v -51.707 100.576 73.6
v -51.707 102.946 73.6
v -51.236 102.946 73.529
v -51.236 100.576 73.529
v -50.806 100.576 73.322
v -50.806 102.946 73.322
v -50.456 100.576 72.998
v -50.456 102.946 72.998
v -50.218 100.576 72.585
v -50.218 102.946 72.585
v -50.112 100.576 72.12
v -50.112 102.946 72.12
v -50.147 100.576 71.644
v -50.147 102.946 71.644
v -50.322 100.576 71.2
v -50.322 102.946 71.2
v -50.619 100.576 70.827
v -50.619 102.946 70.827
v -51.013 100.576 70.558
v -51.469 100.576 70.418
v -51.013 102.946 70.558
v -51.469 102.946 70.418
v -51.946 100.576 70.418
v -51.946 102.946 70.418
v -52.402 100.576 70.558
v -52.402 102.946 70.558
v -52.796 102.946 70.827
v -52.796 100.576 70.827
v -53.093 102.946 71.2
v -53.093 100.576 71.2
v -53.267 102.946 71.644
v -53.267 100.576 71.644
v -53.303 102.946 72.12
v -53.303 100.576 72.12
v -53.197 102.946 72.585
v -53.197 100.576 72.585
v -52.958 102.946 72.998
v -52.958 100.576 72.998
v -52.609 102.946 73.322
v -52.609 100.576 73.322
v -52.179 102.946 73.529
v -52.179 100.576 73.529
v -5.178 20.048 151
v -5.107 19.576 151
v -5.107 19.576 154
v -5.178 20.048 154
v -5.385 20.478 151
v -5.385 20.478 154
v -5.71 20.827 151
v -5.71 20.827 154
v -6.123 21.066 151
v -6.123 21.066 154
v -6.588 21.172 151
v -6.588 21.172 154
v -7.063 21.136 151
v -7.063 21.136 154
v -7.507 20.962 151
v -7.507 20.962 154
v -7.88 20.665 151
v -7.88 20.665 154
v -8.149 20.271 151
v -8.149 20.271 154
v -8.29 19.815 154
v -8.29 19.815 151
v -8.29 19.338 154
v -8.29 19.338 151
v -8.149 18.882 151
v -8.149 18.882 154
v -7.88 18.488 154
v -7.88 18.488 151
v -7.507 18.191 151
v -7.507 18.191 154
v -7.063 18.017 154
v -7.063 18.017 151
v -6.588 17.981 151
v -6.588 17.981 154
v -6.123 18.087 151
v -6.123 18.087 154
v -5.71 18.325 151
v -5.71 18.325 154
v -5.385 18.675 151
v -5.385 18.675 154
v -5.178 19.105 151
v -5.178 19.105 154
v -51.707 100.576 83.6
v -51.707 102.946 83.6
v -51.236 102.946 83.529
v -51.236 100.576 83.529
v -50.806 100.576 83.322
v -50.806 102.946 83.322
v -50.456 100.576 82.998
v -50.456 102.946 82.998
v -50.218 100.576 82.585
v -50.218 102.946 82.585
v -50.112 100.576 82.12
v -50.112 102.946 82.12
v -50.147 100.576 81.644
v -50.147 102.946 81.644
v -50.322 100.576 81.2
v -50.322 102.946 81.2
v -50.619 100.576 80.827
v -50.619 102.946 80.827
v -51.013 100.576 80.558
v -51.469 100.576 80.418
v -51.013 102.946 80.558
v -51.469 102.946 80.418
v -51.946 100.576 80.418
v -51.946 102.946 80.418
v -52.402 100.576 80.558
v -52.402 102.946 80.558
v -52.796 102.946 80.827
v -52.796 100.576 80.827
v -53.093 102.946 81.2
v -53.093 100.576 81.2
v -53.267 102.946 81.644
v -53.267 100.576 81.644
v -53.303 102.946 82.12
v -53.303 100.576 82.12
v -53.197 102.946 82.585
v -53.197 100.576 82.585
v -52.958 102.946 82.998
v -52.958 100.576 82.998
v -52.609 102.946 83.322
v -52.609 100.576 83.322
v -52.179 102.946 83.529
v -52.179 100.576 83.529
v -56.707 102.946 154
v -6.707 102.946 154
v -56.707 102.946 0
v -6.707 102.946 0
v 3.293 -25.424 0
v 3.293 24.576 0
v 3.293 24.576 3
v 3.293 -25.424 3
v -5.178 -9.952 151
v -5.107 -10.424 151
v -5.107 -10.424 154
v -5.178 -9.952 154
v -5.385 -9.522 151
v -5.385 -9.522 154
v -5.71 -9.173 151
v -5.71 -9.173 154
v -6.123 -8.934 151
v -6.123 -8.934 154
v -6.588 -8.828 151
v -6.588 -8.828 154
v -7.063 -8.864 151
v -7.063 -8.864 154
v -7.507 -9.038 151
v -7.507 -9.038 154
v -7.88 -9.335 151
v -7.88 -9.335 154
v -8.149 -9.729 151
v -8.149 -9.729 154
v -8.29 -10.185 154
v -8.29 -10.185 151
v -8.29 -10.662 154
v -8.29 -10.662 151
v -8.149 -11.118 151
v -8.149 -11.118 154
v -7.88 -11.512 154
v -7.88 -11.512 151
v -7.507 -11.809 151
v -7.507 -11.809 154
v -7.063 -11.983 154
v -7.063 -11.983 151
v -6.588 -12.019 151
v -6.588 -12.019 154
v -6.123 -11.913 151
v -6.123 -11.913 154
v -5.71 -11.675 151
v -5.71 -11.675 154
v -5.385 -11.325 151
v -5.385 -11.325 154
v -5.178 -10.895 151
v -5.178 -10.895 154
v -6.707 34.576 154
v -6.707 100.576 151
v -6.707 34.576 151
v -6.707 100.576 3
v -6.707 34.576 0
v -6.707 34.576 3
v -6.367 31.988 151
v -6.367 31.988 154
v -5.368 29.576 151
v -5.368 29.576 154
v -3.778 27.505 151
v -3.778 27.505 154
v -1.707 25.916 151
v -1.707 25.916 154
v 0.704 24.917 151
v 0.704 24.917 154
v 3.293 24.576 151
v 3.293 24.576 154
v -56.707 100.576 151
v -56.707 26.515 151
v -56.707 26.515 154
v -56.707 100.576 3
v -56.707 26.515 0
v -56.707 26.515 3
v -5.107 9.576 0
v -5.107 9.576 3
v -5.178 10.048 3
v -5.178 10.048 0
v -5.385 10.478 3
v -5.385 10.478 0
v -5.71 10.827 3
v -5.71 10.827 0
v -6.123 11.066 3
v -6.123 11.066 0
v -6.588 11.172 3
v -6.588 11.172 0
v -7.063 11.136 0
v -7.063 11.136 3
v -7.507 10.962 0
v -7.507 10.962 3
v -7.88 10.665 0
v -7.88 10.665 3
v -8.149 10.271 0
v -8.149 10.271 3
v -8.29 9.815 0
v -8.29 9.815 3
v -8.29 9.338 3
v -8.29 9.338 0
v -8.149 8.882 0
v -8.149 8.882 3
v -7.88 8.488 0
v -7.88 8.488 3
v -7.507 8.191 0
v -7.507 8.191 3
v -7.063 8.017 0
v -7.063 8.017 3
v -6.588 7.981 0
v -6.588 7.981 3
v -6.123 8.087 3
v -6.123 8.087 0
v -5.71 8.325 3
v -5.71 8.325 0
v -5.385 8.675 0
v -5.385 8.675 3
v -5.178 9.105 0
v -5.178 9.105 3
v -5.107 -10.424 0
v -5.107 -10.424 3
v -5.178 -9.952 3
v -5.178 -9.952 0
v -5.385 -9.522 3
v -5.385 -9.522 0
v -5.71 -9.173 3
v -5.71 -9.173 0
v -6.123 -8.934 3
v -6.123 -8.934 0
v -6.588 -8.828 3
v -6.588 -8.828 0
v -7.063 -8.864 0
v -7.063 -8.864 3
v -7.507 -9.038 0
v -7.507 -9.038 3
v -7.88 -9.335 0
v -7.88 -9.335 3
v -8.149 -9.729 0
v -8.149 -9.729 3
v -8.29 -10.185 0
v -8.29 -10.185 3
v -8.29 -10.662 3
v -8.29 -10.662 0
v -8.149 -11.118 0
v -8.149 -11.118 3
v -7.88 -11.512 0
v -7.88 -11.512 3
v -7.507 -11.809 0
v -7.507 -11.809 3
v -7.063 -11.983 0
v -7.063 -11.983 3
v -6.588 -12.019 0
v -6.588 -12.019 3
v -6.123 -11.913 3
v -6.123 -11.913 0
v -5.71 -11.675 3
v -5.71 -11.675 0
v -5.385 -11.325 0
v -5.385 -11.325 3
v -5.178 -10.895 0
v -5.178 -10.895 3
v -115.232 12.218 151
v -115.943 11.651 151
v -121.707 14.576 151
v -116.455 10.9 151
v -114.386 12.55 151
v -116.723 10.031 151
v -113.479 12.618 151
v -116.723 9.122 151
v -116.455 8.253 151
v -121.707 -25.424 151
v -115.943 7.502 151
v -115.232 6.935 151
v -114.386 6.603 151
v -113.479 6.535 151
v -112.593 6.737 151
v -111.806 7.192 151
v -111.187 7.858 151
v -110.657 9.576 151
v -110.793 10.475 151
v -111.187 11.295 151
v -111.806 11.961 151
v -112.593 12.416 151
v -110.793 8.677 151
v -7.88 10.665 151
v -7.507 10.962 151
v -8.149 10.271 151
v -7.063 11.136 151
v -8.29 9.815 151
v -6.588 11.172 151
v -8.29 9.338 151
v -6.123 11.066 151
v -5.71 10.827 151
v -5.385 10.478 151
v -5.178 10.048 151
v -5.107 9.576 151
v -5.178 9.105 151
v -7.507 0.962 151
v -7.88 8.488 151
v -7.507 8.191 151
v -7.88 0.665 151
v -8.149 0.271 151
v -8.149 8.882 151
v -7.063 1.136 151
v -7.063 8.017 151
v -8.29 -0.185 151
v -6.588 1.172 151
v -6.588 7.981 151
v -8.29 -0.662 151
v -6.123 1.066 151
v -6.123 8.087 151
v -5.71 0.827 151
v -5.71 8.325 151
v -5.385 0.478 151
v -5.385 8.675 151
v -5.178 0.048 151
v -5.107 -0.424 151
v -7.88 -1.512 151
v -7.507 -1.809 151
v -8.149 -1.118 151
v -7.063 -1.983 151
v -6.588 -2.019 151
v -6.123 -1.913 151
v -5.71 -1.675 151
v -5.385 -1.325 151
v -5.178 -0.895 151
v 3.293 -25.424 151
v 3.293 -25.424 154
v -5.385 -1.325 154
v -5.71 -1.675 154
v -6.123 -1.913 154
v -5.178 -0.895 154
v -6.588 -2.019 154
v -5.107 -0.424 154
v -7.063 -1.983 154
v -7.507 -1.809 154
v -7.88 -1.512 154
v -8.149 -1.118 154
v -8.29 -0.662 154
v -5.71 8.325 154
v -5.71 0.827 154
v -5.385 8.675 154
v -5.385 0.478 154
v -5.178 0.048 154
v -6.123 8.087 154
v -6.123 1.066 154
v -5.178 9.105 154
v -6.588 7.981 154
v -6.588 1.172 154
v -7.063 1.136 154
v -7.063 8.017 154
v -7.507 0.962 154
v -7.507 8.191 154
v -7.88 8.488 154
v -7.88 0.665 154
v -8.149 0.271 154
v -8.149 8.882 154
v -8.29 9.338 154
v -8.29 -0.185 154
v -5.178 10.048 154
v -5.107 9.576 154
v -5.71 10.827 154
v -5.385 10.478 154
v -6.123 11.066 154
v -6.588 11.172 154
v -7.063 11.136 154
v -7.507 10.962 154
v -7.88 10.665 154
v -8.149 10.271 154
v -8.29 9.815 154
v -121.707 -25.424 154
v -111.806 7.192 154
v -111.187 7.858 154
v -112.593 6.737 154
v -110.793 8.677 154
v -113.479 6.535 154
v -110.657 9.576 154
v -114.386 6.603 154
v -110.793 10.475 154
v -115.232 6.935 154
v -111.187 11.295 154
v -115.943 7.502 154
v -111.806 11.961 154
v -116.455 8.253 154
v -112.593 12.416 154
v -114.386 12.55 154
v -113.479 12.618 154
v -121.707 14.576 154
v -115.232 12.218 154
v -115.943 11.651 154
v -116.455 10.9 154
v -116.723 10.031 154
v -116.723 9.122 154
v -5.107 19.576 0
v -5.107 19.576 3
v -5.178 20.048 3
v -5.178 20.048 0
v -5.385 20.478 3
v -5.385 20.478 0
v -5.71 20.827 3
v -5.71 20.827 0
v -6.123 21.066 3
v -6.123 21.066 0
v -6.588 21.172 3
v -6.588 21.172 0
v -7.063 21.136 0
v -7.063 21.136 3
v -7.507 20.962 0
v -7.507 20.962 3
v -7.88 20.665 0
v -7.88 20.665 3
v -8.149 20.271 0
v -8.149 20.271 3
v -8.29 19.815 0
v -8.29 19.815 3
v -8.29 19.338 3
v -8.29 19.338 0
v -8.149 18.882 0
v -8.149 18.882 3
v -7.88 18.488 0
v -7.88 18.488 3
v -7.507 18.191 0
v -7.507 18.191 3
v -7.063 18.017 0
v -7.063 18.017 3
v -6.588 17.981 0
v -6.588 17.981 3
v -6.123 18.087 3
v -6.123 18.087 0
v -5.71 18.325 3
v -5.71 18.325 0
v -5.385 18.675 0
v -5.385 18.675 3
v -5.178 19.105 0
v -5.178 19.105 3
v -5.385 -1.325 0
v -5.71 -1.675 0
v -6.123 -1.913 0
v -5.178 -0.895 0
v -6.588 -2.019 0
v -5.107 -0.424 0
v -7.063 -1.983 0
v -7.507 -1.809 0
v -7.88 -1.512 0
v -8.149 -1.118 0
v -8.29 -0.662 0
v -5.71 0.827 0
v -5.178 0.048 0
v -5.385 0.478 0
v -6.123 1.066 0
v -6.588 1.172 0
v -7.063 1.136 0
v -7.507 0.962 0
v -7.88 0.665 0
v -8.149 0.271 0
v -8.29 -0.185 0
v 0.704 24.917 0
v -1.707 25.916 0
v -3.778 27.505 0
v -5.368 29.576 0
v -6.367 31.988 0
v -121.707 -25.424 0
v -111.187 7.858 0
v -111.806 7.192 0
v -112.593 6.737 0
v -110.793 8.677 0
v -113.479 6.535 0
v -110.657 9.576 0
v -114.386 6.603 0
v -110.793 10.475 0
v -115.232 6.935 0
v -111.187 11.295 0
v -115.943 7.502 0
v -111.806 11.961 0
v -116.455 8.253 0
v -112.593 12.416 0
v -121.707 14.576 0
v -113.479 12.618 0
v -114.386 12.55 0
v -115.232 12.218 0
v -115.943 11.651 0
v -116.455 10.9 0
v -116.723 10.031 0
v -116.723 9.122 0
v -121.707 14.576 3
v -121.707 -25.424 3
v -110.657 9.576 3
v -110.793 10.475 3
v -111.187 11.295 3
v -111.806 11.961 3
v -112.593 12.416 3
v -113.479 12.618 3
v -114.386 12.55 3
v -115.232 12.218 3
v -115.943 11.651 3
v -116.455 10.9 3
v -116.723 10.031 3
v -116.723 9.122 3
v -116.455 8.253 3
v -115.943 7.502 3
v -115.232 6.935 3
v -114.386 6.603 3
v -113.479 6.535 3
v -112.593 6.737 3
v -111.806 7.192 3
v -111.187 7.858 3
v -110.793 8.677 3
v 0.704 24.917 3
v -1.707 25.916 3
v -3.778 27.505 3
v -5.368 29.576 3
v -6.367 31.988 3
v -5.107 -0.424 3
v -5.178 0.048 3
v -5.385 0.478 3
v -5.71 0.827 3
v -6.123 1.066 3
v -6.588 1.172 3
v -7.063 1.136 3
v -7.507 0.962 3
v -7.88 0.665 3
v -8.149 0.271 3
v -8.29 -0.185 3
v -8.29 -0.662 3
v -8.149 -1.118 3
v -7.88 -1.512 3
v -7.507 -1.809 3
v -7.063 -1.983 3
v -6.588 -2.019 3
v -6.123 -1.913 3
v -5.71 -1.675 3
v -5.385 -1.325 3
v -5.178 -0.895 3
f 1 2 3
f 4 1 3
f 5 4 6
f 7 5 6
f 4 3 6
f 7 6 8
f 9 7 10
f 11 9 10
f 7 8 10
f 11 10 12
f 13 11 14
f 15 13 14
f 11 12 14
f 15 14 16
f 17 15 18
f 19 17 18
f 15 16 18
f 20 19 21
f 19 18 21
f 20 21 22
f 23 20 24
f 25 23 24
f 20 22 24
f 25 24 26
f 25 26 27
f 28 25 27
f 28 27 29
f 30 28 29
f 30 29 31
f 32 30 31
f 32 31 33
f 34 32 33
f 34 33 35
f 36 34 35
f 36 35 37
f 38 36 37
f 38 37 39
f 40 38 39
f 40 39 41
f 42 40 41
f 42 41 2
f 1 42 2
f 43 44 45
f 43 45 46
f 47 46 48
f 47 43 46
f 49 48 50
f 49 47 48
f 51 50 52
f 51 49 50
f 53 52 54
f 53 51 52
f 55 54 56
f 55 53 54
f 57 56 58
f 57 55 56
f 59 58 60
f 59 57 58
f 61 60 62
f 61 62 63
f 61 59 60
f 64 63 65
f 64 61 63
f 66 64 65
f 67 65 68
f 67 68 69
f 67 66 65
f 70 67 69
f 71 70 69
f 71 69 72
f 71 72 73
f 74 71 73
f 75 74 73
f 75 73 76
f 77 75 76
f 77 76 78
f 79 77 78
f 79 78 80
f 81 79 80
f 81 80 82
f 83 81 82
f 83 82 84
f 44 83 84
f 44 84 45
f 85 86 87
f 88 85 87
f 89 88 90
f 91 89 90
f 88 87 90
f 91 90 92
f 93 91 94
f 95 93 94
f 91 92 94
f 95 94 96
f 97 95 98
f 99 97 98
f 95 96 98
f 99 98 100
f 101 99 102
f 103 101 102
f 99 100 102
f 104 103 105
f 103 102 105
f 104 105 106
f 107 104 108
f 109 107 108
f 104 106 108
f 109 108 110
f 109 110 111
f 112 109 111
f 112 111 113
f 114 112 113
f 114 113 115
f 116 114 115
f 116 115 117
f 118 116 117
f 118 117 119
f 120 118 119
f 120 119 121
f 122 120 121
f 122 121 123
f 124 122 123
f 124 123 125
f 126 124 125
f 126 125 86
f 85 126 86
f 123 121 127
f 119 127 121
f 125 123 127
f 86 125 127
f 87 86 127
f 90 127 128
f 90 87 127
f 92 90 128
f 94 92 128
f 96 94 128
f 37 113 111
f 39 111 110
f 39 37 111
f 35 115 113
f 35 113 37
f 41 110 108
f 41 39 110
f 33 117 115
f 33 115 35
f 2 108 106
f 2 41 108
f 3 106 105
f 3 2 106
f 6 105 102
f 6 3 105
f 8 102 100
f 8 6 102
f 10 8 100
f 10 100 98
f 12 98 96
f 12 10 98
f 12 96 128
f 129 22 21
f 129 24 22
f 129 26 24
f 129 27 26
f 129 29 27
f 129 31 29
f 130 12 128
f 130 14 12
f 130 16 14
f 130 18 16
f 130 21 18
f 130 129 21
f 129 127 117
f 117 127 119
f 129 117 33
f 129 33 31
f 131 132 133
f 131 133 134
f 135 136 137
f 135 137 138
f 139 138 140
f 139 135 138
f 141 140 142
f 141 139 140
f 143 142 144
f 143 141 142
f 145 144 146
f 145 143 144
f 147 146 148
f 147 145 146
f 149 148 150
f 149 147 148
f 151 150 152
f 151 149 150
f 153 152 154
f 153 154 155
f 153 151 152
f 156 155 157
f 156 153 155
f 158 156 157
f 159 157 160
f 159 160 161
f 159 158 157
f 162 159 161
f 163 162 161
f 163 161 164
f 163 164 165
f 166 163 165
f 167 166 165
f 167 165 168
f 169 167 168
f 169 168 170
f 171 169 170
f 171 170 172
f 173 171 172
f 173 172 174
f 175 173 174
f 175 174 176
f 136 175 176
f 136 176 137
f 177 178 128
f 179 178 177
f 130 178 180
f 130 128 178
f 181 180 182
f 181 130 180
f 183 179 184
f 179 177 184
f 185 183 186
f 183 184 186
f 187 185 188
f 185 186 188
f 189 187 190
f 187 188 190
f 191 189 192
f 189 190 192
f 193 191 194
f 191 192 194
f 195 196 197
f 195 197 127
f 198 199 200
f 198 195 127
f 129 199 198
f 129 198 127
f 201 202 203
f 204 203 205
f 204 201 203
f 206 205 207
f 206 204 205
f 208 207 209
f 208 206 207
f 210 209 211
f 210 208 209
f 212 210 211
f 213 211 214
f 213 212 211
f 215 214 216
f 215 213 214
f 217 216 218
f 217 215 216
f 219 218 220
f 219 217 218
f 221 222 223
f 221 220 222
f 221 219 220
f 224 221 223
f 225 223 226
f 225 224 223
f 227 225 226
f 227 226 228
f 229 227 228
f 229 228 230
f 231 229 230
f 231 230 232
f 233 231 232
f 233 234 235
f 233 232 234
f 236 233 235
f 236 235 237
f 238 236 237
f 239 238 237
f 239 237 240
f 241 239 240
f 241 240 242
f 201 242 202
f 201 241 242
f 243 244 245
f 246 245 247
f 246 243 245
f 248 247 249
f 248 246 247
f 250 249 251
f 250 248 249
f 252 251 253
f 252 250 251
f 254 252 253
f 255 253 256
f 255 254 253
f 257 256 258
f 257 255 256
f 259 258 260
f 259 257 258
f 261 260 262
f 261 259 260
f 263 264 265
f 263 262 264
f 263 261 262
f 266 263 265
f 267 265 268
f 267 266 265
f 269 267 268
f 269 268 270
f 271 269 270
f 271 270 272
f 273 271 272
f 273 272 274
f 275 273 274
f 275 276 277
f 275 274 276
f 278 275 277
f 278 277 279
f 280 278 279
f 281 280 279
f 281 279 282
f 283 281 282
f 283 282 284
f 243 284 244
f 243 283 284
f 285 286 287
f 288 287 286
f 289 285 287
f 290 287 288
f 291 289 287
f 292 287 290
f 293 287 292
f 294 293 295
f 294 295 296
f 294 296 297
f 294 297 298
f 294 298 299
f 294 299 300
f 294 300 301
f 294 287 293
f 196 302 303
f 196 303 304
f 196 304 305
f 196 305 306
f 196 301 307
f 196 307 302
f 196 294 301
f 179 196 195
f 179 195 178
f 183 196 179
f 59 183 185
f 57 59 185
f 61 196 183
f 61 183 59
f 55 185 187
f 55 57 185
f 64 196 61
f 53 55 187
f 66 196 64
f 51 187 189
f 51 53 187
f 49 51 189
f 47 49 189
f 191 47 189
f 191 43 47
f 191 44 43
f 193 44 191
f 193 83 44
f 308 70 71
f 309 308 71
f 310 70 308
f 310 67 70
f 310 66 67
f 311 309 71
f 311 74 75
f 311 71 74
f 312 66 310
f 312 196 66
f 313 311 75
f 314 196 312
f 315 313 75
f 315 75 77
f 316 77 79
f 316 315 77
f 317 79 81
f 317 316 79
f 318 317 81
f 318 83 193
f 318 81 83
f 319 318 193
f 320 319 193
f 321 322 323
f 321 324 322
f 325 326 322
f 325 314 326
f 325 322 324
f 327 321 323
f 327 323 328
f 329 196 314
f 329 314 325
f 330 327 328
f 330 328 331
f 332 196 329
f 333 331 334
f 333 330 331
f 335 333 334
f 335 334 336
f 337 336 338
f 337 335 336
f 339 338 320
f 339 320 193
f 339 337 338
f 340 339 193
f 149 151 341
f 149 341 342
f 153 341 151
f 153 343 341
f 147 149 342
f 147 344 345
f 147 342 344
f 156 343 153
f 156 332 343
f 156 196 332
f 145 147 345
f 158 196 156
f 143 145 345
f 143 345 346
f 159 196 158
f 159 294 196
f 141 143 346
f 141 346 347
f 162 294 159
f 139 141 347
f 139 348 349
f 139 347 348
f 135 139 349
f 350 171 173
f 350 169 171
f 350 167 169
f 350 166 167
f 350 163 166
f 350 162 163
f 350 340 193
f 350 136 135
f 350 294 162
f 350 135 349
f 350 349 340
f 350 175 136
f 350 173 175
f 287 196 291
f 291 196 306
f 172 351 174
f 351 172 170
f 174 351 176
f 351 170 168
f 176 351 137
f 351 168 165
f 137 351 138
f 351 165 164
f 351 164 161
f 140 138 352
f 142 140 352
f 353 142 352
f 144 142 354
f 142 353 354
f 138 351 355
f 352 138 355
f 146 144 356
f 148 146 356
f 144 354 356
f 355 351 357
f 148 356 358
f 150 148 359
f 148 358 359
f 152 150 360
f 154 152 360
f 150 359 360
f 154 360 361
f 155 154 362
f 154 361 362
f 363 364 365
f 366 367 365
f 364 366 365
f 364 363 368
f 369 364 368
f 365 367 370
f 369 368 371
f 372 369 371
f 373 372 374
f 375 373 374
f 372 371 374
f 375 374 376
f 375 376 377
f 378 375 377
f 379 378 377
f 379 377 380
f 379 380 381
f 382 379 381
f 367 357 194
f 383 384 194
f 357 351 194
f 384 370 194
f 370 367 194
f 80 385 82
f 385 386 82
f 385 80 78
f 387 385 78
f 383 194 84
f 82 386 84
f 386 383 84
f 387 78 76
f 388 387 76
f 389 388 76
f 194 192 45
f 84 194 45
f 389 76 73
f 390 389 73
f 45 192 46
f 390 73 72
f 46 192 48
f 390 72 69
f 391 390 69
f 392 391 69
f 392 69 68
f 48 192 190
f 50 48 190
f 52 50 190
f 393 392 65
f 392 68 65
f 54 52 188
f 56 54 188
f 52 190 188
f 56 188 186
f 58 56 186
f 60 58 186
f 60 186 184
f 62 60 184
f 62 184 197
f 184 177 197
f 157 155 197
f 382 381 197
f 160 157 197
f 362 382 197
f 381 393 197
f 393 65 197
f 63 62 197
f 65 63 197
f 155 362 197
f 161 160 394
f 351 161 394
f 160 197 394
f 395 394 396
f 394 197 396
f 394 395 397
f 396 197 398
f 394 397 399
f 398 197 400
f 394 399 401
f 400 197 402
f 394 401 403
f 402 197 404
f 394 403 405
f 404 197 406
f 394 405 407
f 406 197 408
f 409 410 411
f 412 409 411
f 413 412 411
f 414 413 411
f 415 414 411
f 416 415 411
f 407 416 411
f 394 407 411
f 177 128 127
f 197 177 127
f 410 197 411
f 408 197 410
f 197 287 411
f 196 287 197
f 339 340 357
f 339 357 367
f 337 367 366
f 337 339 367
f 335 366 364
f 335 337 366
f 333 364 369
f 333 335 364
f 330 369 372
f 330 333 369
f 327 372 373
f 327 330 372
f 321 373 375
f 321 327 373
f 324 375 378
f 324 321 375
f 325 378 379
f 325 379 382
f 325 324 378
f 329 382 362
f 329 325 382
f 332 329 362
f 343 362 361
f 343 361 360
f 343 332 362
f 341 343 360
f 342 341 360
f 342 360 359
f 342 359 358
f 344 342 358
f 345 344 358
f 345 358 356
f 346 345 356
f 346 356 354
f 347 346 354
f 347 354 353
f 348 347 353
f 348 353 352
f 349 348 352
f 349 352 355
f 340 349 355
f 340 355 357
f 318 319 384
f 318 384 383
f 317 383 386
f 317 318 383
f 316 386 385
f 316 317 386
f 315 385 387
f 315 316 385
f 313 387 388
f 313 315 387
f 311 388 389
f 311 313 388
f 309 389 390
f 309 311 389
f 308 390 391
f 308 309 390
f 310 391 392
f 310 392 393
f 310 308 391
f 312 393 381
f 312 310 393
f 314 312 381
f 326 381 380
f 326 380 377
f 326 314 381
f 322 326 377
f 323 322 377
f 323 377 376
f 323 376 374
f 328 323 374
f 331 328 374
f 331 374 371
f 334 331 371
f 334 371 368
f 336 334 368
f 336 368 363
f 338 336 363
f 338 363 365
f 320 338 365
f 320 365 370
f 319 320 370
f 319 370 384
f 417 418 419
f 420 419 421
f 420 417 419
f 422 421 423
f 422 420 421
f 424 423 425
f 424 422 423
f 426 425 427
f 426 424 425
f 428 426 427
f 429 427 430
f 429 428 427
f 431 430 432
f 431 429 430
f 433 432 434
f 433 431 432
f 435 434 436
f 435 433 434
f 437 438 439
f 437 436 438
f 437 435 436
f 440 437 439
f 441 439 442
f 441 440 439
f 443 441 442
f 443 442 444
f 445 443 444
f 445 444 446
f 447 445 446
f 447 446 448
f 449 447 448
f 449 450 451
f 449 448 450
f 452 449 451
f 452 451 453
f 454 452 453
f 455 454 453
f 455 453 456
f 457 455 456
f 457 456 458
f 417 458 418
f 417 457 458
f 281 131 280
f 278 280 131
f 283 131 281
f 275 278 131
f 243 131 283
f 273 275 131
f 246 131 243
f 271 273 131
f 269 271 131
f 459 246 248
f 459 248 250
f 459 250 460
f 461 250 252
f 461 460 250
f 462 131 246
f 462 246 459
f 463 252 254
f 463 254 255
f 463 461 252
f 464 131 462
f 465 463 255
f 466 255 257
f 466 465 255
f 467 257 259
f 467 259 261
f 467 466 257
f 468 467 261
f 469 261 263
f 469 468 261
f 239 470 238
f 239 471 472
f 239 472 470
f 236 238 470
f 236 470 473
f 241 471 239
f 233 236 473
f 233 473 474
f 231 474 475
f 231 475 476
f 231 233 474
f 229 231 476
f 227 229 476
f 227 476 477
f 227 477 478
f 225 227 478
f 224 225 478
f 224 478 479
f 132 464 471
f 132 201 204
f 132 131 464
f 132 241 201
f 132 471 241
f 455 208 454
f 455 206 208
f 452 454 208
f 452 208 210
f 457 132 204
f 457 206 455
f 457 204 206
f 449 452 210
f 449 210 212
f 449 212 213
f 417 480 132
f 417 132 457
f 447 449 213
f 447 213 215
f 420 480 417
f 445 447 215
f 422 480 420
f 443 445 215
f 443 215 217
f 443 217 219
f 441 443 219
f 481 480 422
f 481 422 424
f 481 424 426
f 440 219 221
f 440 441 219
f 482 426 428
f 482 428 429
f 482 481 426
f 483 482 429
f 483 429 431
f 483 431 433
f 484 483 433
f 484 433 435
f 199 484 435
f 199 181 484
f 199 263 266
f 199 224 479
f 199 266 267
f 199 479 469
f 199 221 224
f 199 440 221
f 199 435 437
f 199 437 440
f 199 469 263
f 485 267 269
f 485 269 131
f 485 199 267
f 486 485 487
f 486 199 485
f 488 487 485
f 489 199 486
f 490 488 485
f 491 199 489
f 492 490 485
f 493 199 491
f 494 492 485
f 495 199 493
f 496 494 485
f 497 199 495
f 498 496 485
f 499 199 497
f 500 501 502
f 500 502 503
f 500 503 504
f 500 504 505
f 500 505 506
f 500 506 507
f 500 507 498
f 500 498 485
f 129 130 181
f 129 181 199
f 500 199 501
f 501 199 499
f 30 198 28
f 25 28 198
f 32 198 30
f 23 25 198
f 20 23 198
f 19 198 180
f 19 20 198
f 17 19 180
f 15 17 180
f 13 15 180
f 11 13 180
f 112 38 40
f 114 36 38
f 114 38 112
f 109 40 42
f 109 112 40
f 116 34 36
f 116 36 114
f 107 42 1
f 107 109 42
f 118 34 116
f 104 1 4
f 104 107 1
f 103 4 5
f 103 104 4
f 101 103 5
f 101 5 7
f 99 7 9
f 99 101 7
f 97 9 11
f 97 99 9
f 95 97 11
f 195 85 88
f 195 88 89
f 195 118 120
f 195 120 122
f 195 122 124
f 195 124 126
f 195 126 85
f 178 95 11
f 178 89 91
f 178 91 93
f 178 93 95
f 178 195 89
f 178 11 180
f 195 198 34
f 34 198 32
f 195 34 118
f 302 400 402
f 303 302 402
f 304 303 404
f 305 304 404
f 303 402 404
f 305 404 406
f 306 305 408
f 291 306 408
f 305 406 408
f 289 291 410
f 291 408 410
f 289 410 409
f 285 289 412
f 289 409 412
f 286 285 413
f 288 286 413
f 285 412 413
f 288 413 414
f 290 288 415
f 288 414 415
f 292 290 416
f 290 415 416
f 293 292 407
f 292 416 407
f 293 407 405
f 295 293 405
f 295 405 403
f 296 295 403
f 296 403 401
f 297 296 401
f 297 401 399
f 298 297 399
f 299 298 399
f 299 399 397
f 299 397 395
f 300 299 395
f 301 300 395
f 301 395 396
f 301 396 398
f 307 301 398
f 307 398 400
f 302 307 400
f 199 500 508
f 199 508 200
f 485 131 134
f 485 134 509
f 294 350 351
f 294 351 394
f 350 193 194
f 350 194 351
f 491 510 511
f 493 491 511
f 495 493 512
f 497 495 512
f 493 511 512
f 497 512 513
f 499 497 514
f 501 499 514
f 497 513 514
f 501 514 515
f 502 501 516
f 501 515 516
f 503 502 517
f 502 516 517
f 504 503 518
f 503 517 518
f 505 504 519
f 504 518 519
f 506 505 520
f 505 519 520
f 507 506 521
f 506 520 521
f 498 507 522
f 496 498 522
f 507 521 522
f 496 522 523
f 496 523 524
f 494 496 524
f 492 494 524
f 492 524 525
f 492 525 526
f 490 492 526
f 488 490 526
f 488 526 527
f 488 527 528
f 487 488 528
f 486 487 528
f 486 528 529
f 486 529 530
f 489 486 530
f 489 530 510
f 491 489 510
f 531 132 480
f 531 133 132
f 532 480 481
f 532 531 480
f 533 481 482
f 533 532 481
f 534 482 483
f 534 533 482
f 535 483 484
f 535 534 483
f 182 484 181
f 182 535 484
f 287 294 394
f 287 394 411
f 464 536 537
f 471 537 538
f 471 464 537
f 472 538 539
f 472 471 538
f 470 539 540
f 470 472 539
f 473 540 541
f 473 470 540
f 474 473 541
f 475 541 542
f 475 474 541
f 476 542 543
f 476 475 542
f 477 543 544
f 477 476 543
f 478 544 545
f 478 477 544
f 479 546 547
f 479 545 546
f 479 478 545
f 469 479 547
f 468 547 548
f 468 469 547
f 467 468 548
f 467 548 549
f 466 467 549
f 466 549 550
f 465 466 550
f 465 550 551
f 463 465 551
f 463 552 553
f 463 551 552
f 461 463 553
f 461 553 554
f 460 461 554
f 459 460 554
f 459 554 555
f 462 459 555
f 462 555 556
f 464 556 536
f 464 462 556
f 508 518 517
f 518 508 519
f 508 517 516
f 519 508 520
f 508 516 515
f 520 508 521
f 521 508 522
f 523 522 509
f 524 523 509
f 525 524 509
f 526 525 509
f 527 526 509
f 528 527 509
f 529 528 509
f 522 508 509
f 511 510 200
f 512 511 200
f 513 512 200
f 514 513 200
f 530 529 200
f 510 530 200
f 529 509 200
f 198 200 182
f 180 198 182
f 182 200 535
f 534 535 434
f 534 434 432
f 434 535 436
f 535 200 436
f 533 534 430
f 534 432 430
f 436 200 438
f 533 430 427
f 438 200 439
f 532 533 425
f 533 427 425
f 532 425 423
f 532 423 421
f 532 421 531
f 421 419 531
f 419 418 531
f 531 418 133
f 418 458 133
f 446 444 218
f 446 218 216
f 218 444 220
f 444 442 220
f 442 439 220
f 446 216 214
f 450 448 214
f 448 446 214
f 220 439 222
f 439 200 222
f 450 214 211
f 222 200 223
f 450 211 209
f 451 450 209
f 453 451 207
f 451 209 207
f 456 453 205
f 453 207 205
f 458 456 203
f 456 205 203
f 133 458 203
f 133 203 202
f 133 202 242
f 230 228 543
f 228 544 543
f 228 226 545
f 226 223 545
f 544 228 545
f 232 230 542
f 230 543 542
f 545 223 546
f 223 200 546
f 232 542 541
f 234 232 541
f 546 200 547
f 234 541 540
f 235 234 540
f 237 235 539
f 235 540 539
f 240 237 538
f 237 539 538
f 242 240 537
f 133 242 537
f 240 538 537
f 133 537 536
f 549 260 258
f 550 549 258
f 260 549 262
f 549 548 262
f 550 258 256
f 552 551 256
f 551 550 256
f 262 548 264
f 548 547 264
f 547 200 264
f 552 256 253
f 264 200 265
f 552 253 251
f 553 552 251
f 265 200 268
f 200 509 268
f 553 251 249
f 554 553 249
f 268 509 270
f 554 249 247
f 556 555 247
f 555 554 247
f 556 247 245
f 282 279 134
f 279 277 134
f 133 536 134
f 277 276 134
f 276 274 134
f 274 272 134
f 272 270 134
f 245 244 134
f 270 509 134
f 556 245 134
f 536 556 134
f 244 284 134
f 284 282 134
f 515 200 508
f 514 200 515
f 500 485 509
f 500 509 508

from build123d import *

# Parameters (mm, degrees)
SKETCH_1_R          = 1.6
EXTRUDE_1_DEPTH     = 154
SKETCH_5_R          = 3.05
CUT_EXTRUDE_3_DEPTH = 222.645137515
SKETCH_6_W          = 125
SKETCH_6_H          = 148
CUT_EXTRUDE_5_DEPTH = 126
SKETCH_7_R          = 1.6
CUT_EXTRUDE_6_DEPTH = 119
FILLET_1_R          = 10


with BuildPart() as part:
    # 草图1 → 凸台-拉伸1 (new body)
    with BuildSketch(Plane.XY):
        Polygon((3.292616486, 24.576402747), (3.292616486, -25.423597253), (-121.707383514, -25.423597253), (-121.707383514, 14.576402747), (-56.707383514, 26.515067344), (-56.707383514, 102.946004208), (-6.707383514, 102.946004208), (-6.707383514, 24.576402747), align=None)
        with Locations((-6.707383514, -10.423597253)):
            Circle(SKETCH_1_R, mode=Mode.SUBTRACT)
        with Locations((-6.707383514, -0.423597253)):
            Circle(SKETCH_1_R, mode=Mode.SUBTRACT)
        with Locations((-6.707383514, 9.576402747)):
            Circle(SKETCH_1_R, mode=Mode.SUBTRACT)
        with Locations((-6.707383514, 19.576402747)):
            Circle(SKETCH_1_R, mode=Mode.SUBTRACT)
    extrude(amount=EXTRUDE_1_DEPTH)

    # 草图5 → 切除-拉伸3 (cut, through all)
    with BuildSketch(Plane.XY.offset(154)):
        with Locations((-113.707383514, 9.576402747)):
            Circle(SKETCH_5_R)
    extrude(amount=-CUT_EXTRUDE_3_DEPTH, mode=Mode.SUBTRACT)

    # 草图6 → 切除-拉伸5 (cut)
    with BuildSketch(Plane.XZ.offset(25.423597253)):
        with Locations((-59.207383514, 77)):
            Rectangle(SKETCH_6_W, SKETCH_6_H)
    extrude(amount=-CUT_EXTRUDE_5_DEPTH, mode=Mode.SUBTRACT)

    # 草图7 → 切除-拉伸6 (cut)
    with BuildSketch(Plane(origin=(0, 102.946004208, 0), x_dir=(1, 0, 0), z_dir=(0, 1, 0))):
        with Locations(Location((-51.707383514, -82, 0), (0, 0, 270))):
            Circle(SKETCH_7_R)
        with Locations(Location((-51.707383514, -72, 0), (0, 0, 270))):
            Circle(SKETCH_7_R)
    extrude(amount=-CUT_EXTRUDE_6_DEPTH, mode=Mode.SUBTRACT)

    # 圆角1
    fillet_1_edges = [part.edges().sort_by_distance(p)[0] for p in [
        (-6.707383514, 24.576402747, 1.5),
        (-6.707383514, 24.576402747, 152.5),
    ]]
    fillet(fillet_1_edges, radius=FILLET_1_R - 0.0001)  # a hair under: the kernel refuses the full size


solid = part.part
